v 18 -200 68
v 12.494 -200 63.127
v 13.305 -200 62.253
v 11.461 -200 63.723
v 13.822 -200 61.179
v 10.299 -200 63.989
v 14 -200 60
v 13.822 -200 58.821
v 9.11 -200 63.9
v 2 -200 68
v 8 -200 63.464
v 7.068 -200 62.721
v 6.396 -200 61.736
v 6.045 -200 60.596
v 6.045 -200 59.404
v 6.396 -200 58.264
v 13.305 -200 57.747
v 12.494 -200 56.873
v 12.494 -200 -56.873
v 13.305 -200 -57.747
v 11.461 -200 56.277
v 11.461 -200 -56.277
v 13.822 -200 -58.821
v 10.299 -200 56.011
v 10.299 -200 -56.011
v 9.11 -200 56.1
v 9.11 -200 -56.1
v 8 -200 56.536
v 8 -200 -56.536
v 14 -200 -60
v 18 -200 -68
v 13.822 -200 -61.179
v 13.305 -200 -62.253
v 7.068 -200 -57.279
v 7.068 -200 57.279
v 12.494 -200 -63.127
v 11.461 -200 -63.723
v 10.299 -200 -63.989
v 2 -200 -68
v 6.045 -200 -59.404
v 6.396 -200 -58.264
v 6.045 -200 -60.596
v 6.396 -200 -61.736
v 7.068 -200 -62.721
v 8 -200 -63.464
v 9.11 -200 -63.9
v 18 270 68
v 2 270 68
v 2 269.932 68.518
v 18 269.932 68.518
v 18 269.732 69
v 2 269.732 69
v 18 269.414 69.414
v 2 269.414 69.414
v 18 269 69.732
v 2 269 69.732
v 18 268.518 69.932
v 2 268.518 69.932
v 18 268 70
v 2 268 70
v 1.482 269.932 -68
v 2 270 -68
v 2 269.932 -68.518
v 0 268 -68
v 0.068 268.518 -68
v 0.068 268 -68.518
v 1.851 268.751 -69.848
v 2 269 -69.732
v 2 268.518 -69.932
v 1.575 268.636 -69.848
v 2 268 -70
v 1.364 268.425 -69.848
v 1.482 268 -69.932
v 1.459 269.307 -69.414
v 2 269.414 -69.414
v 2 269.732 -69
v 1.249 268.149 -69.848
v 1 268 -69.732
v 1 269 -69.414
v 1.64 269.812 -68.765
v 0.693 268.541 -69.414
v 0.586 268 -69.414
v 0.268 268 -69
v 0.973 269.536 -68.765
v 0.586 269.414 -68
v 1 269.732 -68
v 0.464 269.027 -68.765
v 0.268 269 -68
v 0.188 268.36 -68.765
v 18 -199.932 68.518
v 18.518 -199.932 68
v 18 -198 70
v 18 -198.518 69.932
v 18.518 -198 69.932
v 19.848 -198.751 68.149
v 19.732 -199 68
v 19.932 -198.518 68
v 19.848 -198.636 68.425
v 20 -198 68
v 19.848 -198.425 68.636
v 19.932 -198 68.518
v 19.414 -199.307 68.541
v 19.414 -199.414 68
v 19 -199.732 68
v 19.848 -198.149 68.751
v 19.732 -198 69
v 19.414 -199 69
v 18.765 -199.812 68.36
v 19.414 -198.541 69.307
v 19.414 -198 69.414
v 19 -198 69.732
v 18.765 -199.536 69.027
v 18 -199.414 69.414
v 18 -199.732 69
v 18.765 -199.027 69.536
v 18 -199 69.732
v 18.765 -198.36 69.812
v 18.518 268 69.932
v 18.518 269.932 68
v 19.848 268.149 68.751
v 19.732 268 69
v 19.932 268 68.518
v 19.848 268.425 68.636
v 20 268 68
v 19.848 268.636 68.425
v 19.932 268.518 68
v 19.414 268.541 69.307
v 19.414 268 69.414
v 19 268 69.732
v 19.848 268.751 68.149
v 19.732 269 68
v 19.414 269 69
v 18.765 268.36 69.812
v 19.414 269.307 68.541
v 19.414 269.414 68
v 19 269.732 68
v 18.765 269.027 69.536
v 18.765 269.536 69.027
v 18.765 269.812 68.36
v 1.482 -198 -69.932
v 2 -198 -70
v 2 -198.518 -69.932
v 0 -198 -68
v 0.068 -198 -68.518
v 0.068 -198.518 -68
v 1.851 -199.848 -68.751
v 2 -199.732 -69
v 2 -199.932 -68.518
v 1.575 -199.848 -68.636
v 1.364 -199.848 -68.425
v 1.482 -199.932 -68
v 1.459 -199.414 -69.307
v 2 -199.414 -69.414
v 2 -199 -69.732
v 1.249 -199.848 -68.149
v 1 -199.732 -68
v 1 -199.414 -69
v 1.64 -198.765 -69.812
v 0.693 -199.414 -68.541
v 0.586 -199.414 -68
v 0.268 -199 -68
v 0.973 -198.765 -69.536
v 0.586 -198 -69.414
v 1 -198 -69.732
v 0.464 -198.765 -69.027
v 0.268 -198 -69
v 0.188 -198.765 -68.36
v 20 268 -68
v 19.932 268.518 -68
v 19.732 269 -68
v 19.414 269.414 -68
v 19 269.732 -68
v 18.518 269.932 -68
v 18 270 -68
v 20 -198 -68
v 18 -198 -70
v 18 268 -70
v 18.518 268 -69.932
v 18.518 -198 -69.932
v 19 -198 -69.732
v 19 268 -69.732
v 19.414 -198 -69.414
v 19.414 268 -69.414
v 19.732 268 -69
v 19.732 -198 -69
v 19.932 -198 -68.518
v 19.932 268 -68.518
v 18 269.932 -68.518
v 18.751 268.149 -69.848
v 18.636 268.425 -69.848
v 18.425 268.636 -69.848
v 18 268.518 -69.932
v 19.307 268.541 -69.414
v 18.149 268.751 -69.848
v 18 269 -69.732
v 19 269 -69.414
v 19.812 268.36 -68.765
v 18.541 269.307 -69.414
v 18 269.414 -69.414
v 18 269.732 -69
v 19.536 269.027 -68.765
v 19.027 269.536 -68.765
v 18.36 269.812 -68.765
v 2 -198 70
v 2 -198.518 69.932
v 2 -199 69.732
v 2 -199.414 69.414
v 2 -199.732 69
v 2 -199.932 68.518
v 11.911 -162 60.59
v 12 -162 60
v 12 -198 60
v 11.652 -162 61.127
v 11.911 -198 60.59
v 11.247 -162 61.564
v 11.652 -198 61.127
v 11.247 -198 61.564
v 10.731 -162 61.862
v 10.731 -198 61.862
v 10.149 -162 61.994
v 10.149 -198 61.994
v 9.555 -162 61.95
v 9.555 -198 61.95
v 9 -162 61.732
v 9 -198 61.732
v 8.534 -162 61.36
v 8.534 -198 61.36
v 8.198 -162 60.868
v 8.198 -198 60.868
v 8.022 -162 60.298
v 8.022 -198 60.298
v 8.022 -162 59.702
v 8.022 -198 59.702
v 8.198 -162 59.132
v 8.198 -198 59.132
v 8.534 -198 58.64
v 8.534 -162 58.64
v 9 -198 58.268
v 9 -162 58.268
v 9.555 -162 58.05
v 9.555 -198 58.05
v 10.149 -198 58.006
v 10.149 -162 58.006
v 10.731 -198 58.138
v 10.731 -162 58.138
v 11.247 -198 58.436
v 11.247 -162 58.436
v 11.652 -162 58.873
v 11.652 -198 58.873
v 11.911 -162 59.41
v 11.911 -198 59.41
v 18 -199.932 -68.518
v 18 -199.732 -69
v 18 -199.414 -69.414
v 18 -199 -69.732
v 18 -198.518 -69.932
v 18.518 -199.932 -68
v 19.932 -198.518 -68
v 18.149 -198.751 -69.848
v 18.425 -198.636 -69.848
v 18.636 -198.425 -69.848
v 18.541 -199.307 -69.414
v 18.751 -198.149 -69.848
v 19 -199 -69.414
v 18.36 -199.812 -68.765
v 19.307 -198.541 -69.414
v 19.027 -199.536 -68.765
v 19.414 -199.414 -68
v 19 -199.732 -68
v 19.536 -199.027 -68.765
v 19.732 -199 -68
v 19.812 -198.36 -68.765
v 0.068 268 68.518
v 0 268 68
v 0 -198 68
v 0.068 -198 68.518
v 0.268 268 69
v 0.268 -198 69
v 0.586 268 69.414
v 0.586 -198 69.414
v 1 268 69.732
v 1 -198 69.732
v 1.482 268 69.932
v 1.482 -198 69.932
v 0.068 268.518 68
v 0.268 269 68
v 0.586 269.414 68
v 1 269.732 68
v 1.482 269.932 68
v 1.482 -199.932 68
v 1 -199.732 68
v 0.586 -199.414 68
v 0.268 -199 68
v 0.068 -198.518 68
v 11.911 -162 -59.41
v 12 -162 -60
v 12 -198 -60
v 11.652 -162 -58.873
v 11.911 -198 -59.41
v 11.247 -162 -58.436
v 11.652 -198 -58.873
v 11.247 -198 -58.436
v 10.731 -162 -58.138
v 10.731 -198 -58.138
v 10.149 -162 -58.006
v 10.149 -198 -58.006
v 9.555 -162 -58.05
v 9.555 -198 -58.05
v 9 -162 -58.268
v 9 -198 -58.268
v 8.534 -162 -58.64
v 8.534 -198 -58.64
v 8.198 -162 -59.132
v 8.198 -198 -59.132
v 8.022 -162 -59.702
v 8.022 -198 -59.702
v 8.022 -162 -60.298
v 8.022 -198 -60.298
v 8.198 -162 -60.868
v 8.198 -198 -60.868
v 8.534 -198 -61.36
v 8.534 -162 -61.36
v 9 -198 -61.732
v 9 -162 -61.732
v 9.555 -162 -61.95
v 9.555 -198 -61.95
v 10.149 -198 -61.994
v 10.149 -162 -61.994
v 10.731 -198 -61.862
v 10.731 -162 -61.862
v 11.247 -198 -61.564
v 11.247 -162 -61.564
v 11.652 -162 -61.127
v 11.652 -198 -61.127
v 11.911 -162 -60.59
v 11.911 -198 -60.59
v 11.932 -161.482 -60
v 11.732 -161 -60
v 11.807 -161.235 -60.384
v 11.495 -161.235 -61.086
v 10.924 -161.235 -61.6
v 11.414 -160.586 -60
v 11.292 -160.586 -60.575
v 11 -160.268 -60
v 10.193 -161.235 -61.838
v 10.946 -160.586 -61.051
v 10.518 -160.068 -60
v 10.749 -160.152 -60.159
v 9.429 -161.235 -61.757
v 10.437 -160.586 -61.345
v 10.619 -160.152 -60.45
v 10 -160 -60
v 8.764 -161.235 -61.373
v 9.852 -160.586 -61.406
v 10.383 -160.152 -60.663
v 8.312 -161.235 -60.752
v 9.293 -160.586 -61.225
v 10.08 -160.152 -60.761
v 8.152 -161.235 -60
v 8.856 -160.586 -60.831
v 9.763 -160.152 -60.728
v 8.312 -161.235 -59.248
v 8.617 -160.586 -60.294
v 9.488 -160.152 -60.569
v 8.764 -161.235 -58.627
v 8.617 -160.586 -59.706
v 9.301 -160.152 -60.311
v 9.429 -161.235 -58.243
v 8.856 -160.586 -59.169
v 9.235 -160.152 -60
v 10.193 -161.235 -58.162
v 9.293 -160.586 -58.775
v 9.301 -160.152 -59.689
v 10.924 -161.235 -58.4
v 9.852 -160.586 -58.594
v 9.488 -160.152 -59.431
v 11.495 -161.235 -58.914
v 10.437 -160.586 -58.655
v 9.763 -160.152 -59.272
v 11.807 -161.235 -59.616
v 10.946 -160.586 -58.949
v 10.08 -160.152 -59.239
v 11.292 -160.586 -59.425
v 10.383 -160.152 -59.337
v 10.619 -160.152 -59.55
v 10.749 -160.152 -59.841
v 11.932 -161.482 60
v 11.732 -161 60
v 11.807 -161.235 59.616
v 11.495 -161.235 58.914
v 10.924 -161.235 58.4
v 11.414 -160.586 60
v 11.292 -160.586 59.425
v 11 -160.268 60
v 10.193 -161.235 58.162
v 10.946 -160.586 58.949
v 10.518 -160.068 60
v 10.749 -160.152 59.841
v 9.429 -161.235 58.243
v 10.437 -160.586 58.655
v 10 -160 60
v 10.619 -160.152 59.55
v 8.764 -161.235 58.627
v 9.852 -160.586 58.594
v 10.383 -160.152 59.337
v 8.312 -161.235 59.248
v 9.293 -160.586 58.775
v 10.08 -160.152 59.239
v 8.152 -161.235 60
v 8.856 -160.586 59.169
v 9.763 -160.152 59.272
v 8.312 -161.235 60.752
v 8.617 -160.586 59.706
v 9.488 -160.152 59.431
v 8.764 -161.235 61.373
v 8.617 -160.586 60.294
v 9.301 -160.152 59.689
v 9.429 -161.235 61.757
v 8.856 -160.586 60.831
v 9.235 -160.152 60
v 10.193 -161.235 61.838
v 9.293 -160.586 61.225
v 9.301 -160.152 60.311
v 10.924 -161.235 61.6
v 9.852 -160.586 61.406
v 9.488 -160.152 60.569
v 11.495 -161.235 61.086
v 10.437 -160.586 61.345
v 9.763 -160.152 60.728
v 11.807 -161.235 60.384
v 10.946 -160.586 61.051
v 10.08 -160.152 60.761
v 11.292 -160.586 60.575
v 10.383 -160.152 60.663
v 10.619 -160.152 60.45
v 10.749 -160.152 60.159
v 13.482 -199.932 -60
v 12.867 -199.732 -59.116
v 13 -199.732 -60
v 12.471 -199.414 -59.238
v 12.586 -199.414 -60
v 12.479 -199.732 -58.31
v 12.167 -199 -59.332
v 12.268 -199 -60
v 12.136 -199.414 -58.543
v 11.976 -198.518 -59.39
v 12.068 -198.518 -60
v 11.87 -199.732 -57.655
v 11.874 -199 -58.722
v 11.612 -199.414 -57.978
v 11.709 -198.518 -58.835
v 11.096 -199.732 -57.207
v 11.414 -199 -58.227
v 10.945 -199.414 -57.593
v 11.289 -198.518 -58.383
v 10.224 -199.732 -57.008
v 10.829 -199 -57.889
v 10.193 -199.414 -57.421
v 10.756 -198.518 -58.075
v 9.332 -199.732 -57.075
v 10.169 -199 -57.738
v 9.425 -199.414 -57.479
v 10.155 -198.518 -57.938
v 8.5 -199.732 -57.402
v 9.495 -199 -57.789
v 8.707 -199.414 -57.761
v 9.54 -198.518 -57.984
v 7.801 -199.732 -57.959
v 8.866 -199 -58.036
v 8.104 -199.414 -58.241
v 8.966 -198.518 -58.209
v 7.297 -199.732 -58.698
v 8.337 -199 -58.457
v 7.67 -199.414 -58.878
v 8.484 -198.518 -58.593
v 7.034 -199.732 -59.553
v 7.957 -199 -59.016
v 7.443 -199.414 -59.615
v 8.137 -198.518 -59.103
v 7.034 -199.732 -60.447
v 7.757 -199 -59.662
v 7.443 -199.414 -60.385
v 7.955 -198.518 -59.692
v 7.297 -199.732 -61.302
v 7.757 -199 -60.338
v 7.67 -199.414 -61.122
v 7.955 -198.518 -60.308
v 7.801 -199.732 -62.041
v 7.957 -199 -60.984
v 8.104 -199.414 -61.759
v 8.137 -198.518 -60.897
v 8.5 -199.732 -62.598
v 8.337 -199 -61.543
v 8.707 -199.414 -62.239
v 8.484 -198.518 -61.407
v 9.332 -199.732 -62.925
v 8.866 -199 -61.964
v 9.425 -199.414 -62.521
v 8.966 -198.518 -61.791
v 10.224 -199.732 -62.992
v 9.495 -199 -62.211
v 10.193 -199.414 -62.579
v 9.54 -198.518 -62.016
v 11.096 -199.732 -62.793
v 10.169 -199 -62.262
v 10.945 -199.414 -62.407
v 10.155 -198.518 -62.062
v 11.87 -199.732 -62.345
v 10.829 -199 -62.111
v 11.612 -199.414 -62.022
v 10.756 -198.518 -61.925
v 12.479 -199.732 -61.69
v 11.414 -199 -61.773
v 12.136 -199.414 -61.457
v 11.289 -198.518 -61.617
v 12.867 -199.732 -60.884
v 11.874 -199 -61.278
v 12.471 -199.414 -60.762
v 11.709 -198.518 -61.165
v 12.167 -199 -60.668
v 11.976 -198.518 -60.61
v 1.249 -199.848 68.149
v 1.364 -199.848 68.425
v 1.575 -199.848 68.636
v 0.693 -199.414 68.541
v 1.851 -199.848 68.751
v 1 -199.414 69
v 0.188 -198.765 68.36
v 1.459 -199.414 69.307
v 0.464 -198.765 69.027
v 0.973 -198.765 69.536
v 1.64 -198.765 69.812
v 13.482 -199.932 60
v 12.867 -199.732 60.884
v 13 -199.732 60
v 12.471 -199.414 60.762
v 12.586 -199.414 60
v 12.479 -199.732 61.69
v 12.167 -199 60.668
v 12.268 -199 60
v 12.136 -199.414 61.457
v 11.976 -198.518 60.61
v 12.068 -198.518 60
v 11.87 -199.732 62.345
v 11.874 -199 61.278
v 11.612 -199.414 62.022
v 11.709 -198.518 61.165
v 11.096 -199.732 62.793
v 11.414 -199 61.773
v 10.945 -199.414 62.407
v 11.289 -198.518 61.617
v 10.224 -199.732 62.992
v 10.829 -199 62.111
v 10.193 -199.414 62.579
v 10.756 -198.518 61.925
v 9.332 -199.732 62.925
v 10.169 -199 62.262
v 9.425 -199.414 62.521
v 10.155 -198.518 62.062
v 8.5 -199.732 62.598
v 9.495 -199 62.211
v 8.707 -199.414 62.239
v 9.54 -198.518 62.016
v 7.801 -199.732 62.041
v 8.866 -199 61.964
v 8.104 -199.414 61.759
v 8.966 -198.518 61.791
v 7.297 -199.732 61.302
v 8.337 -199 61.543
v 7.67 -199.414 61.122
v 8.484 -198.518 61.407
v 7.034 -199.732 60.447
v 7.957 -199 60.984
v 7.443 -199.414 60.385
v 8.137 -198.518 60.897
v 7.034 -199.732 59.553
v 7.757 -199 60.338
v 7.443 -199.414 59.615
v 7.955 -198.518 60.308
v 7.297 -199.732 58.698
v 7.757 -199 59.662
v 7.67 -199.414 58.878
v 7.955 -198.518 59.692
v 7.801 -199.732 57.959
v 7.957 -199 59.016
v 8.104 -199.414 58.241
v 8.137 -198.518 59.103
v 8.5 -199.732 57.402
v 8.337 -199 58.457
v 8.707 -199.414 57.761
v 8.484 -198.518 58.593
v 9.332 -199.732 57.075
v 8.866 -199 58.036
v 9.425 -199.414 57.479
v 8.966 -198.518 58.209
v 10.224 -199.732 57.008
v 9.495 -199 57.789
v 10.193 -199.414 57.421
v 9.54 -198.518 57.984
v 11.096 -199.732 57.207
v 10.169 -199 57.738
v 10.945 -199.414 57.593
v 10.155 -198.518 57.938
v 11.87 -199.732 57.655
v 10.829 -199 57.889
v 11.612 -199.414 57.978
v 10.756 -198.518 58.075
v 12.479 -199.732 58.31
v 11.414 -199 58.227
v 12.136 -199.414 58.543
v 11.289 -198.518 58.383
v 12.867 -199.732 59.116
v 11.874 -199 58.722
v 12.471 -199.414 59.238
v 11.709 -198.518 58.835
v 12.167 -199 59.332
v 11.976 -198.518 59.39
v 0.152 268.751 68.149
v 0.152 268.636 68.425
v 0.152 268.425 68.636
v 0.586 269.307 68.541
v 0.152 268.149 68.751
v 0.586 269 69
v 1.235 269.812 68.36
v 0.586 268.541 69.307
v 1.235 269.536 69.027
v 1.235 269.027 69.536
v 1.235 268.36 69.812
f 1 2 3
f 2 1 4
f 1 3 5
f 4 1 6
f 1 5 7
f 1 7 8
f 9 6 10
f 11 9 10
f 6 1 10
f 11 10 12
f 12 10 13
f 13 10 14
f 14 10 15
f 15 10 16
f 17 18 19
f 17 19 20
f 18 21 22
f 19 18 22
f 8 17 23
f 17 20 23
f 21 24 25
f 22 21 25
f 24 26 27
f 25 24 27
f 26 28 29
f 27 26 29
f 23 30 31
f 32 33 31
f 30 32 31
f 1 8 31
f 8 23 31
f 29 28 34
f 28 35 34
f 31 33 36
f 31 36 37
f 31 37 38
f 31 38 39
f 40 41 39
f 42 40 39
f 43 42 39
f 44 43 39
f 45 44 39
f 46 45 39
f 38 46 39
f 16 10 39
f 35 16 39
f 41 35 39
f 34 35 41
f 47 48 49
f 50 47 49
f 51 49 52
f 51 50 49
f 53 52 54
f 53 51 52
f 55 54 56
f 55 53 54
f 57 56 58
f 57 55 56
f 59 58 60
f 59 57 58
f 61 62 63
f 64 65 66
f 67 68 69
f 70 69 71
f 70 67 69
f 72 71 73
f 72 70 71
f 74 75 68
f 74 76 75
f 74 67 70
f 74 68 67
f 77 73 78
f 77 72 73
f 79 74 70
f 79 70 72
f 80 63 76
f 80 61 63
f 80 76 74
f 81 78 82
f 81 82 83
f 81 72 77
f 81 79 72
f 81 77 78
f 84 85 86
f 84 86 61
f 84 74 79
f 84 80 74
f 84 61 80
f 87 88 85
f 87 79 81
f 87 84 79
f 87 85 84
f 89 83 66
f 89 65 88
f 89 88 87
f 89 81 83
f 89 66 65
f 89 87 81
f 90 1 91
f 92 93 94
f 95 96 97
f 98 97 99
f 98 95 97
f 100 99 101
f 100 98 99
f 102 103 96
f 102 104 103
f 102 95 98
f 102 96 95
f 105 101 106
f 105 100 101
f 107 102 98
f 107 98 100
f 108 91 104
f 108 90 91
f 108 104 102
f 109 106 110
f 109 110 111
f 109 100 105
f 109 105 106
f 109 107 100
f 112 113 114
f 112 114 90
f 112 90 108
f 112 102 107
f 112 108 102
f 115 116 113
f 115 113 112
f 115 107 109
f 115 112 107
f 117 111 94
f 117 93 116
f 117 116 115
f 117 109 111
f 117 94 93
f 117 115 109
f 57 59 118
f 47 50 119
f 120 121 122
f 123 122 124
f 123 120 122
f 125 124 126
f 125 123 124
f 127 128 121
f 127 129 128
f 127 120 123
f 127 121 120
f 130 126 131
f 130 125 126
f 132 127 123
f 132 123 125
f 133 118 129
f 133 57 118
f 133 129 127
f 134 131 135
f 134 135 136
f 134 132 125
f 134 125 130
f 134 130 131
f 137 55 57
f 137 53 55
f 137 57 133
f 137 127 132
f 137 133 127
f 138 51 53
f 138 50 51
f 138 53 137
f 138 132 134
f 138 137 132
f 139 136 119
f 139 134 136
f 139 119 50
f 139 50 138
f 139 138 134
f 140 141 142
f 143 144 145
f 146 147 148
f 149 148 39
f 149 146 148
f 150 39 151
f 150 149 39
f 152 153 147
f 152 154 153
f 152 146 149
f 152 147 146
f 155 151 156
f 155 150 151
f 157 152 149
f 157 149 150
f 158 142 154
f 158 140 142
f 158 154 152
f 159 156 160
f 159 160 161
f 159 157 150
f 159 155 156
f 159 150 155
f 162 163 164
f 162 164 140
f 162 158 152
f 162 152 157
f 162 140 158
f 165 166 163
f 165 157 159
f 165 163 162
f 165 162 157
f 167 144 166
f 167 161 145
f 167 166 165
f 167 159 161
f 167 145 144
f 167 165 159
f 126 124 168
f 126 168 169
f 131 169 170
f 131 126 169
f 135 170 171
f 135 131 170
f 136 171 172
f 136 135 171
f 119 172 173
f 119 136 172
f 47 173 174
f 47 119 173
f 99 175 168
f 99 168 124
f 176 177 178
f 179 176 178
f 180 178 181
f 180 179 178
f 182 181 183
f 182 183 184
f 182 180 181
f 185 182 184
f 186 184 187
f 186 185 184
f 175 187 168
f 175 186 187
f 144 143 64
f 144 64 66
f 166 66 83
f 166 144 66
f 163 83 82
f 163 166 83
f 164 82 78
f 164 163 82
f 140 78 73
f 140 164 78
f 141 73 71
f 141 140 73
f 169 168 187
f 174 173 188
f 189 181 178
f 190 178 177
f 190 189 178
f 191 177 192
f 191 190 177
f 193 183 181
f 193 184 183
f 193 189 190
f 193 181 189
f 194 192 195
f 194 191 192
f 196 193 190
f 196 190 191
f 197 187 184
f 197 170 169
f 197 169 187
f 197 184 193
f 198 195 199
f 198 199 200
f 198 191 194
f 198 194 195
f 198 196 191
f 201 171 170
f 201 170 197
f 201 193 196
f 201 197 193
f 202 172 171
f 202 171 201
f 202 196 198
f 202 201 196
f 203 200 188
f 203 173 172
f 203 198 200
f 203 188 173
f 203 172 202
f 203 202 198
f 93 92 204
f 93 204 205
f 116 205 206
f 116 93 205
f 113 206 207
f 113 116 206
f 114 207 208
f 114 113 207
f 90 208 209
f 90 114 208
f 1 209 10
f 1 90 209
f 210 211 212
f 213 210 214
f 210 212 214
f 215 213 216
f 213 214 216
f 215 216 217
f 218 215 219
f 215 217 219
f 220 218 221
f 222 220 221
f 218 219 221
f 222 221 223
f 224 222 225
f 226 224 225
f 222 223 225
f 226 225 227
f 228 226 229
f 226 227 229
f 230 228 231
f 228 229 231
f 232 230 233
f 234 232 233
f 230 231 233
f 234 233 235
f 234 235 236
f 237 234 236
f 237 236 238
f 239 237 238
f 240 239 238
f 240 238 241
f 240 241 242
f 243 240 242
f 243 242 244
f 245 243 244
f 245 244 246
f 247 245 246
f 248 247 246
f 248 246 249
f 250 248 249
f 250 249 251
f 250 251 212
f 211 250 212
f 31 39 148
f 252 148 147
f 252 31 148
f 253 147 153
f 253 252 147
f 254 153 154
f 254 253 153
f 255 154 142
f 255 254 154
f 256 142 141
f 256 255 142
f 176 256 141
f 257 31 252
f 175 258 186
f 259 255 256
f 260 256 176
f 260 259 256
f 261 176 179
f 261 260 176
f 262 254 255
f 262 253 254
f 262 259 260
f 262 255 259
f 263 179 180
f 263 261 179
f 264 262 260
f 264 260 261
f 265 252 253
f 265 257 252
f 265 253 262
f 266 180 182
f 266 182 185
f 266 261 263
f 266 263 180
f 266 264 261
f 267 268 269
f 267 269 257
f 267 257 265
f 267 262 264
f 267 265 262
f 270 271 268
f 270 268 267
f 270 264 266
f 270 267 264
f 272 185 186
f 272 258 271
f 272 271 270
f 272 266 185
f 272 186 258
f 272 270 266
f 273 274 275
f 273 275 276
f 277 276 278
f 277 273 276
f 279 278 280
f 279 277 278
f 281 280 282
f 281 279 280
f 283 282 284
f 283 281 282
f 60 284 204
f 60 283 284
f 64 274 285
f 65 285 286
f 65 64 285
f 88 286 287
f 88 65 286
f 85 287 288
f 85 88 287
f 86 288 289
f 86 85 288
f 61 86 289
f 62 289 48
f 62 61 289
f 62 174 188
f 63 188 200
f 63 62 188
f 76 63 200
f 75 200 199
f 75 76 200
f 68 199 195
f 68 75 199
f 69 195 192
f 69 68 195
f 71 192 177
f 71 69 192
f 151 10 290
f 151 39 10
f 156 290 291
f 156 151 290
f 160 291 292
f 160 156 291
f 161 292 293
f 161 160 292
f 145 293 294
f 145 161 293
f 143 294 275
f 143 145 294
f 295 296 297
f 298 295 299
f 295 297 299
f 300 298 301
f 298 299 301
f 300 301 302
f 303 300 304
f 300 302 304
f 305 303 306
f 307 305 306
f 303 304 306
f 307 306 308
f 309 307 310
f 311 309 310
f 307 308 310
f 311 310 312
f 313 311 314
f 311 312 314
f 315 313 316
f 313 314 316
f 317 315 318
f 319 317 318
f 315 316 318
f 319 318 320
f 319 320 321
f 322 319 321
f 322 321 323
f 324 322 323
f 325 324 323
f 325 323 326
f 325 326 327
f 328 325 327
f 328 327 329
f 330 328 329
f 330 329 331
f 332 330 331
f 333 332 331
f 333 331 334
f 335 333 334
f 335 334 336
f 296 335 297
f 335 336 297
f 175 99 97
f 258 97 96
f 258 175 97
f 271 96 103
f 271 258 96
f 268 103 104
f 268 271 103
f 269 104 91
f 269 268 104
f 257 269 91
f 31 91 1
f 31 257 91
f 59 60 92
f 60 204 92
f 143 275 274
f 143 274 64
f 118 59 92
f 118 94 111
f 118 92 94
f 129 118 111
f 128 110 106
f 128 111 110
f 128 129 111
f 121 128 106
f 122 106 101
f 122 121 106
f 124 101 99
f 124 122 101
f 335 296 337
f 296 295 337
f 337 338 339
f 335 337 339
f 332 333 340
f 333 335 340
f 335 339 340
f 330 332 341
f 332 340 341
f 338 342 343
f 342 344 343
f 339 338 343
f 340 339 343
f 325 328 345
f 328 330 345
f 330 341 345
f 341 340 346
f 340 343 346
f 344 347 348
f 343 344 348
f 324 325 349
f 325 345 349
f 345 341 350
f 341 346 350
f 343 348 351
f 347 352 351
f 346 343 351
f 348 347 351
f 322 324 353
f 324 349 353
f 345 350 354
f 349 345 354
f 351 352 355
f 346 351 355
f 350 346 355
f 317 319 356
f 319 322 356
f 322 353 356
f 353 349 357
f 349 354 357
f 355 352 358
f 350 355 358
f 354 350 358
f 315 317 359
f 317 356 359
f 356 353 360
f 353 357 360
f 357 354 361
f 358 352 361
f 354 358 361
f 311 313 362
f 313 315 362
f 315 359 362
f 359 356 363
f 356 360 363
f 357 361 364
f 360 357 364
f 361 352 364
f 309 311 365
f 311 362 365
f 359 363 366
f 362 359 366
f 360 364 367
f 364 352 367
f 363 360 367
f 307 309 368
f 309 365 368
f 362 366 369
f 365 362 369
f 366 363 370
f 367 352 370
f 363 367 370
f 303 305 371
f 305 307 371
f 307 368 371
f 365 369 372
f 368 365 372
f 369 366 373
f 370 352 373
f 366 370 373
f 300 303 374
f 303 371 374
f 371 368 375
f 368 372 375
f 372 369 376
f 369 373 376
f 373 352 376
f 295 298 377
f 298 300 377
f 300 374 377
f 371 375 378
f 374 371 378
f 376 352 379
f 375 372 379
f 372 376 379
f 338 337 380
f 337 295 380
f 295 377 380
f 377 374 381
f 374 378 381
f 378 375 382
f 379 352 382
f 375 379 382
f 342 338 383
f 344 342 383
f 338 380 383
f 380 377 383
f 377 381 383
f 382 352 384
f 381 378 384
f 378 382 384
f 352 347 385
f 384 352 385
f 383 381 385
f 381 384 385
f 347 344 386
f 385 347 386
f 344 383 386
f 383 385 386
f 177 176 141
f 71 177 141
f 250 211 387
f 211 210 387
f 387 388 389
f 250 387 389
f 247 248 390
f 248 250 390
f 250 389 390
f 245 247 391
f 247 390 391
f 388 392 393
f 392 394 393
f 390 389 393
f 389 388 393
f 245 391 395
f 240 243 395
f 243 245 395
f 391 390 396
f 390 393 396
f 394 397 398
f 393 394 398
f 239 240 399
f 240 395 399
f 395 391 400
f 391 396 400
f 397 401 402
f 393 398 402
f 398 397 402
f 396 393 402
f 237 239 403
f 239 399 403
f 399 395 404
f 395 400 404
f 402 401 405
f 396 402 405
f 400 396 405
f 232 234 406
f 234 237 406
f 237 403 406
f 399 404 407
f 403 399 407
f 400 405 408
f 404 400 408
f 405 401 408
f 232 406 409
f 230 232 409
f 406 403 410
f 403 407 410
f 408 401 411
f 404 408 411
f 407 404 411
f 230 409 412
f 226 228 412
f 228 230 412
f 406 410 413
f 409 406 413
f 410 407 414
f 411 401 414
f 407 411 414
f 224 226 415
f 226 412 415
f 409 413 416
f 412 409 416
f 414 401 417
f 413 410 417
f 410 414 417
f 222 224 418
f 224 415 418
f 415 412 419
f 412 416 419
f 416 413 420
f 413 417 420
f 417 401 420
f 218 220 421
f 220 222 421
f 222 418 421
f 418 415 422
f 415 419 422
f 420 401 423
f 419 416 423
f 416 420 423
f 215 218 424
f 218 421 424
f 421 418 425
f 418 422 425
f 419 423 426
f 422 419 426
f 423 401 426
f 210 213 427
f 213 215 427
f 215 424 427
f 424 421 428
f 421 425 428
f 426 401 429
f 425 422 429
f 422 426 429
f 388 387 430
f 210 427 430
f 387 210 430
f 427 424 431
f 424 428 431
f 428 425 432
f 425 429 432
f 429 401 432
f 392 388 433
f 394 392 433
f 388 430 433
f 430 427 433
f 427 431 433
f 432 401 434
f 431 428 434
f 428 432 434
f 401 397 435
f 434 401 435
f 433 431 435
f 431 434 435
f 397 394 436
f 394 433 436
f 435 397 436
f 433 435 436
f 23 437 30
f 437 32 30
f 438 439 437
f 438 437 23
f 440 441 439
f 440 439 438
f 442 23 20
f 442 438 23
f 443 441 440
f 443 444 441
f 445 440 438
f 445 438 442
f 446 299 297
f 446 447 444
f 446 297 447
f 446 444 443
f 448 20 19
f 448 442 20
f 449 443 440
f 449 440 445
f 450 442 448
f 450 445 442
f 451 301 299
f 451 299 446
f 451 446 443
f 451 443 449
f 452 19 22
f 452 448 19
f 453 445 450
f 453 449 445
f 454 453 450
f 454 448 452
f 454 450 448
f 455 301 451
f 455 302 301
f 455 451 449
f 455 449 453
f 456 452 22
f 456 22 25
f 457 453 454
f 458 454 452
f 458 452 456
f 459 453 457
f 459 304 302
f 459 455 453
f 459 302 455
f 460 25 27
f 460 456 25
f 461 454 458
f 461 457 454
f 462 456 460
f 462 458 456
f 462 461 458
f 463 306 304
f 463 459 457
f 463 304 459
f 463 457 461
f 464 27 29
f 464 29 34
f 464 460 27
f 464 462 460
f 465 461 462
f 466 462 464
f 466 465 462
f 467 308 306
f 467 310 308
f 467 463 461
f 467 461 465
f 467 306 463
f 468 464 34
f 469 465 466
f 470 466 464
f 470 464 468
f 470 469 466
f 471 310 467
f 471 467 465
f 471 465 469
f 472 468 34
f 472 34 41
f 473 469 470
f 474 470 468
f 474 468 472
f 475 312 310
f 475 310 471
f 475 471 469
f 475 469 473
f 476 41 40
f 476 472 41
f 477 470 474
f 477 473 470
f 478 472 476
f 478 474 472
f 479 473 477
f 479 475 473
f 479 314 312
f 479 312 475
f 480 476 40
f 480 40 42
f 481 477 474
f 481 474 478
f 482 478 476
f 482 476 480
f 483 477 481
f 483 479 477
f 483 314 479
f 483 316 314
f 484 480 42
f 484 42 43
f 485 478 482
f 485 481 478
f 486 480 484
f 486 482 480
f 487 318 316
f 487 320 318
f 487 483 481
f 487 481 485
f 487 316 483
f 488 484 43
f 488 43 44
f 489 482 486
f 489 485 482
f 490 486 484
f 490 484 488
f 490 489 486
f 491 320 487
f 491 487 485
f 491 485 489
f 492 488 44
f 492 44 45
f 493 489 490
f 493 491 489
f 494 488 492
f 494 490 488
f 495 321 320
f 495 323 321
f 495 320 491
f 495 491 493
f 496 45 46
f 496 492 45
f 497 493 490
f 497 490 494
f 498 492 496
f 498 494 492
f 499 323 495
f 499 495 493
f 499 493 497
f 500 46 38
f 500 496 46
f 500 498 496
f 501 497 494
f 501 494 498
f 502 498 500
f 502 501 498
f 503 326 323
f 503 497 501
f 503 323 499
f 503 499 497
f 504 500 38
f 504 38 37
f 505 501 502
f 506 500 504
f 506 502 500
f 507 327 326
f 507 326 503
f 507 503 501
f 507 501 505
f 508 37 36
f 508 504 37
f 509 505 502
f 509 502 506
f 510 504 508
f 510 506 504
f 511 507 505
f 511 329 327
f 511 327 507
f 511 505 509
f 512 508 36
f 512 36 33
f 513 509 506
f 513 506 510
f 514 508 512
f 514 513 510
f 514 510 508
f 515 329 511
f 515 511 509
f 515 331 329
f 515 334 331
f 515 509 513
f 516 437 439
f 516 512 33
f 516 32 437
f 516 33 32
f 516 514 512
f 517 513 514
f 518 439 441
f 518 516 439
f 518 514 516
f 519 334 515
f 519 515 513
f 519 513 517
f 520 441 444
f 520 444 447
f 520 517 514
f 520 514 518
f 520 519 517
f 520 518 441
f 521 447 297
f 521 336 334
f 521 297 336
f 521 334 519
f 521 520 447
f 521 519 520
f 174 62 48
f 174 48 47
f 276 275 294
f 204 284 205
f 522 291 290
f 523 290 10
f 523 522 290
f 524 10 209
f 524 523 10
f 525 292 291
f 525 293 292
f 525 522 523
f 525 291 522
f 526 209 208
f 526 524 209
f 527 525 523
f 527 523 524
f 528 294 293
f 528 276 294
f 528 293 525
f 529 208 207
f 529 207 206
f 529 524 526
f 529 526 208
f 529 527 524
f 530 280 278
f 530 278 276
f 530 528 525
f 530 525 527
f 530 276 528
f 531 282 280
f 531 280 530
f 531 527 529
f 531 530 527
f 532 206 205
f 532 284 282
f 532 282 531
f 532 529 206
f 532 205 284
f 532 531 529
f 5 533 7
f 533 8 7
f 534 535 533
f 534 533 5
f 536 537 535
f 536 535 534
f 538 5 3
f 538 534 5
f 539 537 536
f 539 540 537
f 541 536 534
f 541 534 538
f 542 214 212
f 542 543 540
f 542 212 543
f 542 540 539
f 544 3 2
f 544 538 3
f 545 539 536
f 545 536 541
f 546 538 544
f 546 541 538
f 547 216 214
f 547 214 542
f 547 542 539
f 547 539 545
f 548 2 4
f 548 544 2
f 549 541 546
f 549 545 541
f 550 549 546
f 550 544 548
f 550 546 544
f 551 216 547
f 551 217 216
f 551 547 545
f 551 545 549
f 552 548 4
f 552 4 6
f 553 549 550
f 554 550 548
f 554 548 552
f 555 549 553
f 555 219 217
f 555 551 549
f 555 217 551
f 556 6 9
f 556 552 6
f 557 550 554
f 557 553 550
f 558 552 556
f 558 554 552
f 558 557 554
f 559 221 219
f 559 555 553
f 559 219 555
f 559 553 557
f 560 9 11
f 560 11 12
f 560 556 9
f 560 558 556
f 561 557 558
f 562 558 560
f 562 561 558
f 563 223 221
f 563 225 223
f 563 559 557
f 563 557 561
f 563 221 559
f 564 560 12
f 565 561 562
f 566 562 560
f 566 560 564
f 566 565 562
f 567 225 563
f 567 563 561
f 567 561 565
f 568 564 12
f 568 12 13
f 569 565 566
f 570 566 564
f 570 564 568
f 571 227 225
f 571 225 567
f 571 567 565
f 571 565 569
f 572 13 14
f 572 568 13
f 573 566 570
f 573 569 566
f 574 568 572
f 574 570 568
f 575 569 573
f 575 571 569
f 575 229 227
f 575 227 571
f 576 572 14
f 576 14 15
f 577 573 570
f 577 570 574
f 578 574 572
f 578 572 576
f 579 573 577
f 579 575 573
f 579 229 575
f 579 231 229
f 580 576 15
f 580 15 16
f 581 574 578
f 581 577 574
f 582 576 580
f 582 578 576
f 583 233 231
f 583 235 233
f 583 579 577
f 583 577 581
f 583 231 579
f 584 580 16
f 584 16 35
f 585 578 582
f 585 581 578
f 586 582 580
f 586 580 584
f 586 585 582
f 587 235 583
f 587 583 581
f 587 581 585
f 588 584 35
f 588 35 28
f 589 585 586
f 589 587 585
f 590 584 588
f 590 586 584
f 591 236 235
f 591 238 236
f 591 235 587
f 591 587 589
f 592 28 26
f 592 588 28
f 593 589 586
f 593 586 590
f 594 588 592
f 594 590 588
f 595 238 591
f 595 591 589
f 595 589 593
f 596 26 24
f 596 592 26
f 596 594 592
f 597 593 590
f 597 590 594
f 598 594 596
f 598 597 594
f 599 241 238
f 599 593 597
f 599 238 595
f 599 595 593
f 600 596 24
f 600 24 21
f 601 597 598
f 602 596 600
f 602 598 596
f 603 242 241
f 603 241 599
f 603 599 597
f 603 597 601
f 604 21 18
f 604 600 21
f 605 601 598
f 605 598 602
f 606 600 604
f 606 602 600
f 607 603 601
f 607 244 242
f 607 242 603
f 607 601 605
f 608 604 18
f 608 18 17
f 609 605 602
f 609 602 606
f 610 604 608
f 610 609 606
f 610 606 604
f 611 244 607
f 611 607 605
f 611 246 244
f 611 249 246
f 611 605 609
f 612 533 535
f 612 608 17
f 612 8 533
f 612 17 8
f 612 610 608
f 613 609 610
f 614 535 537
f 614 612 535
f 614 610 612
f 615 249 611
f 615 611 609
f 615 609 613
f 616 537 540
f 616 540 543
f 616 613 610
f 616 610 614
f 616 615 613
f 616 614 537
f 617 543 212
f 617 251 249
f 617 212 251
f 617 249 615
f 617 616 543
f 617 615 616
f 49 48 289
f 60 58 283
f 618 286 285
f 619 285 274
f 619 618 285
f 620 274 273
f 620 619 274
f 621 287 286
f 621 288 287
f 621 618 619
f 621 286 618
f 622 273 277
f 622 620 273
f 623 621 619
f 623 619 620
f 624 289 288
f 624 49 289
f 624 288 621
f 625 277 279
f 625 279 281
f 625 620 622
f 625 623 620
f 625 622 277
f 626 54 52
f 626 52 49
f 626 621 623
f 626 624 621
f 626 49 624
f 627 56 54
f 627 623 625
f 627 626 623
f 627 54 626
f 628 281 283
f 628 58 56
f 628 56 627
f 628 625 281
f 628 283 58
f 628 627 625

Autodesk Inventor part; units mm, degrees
ref_plane "YZ Plane" through (0, 0, 0) normal (1, 0, 0) x (0, 1, 0)
ref_plane "XZ Plane" through (0, 0, 0) normal (0, 1, 0) x (-1, 0, 0)
ref_plane "XY Plane" through (0, 0, 0) normal (0, 0, 1) x (1, 0, 0)
sketch "草图1" plane through (0, 0, 0) normal (0, 0, 1) x (1, 0, 0)
  point P0 (0, 0)
sketch "草图2" plane through (0, 0, 0) normal (1, 0, 0) x (0, 1, 0)
  line L0 (200, 70) -> (-200, 70)
  line L1 (-200, 70) -> (-200, -70)
  line L2 (-200, -70) -> (200, -70)
  line L3 (200, -70) -> (200, 70)
  point P0 (0, 0)
  dimension "d0" = 400
  dimension "d1" = 140
extrude "拉伸1" add sketch "草图2" along normal blind 20
sketch "草图3" plane through (0, -200, -70) normal (0, -1, 0) x (1, 0, 0)
  circle A0 centre (10, 10) radius 2
  point P0 (0, 70)
  dimension "d4" = 4
extrude "拉伸2" cut sketch "草图3" against normal blind 40
sketch "草图4" plane through (0, -200, -70) normal (0, -1, 0) x (1, 0, 0)
  circle A0 centre (10, 130) radius 2
  point P0 (0, 70)
  dimension "d7" = 4
extrude "拉伸3" cut sketch "草图4" against normal blind 40
sketch "草图5" plane through (0, 200, 70) normal (0, 1, 0) x (1, 0, 0)
  line L0 (20, 0) -> (20, 140) projected
  line L1 (20, 140) -> (0, 140)
  line L2 (0, 140) -> (0, 0)
  line L3 (0, 0) -> (20, 0)
  line L4 (20, 0) -> (20, 140)
  point P0 (0, 70)
extrude "拉伸4" add sketch "草图5" along normal blind 50
sketch "草图6" plane through (0, 250, 70) normal (0, 1, 0) x (1, 0, 0)
  line L0 (0, 0) -> (20, 0) projected
  line L1 (20, 140) -> (0, 140) projected
  line L2 (20, 0) -> (0, 0)
  line L3 (0, 0) -> (0, 140)
  line L4 (0, 140) -> (20, 140)
  line L5 (20, 140) -> (20, 0)
  point P0 (0, 70)
extrude "拉伸5" add sketch "草图6" along normal blind 20
fillet "圆角1" radius 2 2 edges at (8, -160, 60) (8, -160, -60)
fillet "圆角1" radius 2 14 edges at (10, 270, 70) (0, 35, 70) (10, -200, 70) (20, 35, 70) (20, 270, 0) (20, -200, 0) (20, 35, -70) (0, 270, 0) (0, 35, -70) (0, -200, 0) (10, 270, -70) (10, -200, -70) (8, -200, 60) (8, -200, -60)
properties part number "内层侧板"
